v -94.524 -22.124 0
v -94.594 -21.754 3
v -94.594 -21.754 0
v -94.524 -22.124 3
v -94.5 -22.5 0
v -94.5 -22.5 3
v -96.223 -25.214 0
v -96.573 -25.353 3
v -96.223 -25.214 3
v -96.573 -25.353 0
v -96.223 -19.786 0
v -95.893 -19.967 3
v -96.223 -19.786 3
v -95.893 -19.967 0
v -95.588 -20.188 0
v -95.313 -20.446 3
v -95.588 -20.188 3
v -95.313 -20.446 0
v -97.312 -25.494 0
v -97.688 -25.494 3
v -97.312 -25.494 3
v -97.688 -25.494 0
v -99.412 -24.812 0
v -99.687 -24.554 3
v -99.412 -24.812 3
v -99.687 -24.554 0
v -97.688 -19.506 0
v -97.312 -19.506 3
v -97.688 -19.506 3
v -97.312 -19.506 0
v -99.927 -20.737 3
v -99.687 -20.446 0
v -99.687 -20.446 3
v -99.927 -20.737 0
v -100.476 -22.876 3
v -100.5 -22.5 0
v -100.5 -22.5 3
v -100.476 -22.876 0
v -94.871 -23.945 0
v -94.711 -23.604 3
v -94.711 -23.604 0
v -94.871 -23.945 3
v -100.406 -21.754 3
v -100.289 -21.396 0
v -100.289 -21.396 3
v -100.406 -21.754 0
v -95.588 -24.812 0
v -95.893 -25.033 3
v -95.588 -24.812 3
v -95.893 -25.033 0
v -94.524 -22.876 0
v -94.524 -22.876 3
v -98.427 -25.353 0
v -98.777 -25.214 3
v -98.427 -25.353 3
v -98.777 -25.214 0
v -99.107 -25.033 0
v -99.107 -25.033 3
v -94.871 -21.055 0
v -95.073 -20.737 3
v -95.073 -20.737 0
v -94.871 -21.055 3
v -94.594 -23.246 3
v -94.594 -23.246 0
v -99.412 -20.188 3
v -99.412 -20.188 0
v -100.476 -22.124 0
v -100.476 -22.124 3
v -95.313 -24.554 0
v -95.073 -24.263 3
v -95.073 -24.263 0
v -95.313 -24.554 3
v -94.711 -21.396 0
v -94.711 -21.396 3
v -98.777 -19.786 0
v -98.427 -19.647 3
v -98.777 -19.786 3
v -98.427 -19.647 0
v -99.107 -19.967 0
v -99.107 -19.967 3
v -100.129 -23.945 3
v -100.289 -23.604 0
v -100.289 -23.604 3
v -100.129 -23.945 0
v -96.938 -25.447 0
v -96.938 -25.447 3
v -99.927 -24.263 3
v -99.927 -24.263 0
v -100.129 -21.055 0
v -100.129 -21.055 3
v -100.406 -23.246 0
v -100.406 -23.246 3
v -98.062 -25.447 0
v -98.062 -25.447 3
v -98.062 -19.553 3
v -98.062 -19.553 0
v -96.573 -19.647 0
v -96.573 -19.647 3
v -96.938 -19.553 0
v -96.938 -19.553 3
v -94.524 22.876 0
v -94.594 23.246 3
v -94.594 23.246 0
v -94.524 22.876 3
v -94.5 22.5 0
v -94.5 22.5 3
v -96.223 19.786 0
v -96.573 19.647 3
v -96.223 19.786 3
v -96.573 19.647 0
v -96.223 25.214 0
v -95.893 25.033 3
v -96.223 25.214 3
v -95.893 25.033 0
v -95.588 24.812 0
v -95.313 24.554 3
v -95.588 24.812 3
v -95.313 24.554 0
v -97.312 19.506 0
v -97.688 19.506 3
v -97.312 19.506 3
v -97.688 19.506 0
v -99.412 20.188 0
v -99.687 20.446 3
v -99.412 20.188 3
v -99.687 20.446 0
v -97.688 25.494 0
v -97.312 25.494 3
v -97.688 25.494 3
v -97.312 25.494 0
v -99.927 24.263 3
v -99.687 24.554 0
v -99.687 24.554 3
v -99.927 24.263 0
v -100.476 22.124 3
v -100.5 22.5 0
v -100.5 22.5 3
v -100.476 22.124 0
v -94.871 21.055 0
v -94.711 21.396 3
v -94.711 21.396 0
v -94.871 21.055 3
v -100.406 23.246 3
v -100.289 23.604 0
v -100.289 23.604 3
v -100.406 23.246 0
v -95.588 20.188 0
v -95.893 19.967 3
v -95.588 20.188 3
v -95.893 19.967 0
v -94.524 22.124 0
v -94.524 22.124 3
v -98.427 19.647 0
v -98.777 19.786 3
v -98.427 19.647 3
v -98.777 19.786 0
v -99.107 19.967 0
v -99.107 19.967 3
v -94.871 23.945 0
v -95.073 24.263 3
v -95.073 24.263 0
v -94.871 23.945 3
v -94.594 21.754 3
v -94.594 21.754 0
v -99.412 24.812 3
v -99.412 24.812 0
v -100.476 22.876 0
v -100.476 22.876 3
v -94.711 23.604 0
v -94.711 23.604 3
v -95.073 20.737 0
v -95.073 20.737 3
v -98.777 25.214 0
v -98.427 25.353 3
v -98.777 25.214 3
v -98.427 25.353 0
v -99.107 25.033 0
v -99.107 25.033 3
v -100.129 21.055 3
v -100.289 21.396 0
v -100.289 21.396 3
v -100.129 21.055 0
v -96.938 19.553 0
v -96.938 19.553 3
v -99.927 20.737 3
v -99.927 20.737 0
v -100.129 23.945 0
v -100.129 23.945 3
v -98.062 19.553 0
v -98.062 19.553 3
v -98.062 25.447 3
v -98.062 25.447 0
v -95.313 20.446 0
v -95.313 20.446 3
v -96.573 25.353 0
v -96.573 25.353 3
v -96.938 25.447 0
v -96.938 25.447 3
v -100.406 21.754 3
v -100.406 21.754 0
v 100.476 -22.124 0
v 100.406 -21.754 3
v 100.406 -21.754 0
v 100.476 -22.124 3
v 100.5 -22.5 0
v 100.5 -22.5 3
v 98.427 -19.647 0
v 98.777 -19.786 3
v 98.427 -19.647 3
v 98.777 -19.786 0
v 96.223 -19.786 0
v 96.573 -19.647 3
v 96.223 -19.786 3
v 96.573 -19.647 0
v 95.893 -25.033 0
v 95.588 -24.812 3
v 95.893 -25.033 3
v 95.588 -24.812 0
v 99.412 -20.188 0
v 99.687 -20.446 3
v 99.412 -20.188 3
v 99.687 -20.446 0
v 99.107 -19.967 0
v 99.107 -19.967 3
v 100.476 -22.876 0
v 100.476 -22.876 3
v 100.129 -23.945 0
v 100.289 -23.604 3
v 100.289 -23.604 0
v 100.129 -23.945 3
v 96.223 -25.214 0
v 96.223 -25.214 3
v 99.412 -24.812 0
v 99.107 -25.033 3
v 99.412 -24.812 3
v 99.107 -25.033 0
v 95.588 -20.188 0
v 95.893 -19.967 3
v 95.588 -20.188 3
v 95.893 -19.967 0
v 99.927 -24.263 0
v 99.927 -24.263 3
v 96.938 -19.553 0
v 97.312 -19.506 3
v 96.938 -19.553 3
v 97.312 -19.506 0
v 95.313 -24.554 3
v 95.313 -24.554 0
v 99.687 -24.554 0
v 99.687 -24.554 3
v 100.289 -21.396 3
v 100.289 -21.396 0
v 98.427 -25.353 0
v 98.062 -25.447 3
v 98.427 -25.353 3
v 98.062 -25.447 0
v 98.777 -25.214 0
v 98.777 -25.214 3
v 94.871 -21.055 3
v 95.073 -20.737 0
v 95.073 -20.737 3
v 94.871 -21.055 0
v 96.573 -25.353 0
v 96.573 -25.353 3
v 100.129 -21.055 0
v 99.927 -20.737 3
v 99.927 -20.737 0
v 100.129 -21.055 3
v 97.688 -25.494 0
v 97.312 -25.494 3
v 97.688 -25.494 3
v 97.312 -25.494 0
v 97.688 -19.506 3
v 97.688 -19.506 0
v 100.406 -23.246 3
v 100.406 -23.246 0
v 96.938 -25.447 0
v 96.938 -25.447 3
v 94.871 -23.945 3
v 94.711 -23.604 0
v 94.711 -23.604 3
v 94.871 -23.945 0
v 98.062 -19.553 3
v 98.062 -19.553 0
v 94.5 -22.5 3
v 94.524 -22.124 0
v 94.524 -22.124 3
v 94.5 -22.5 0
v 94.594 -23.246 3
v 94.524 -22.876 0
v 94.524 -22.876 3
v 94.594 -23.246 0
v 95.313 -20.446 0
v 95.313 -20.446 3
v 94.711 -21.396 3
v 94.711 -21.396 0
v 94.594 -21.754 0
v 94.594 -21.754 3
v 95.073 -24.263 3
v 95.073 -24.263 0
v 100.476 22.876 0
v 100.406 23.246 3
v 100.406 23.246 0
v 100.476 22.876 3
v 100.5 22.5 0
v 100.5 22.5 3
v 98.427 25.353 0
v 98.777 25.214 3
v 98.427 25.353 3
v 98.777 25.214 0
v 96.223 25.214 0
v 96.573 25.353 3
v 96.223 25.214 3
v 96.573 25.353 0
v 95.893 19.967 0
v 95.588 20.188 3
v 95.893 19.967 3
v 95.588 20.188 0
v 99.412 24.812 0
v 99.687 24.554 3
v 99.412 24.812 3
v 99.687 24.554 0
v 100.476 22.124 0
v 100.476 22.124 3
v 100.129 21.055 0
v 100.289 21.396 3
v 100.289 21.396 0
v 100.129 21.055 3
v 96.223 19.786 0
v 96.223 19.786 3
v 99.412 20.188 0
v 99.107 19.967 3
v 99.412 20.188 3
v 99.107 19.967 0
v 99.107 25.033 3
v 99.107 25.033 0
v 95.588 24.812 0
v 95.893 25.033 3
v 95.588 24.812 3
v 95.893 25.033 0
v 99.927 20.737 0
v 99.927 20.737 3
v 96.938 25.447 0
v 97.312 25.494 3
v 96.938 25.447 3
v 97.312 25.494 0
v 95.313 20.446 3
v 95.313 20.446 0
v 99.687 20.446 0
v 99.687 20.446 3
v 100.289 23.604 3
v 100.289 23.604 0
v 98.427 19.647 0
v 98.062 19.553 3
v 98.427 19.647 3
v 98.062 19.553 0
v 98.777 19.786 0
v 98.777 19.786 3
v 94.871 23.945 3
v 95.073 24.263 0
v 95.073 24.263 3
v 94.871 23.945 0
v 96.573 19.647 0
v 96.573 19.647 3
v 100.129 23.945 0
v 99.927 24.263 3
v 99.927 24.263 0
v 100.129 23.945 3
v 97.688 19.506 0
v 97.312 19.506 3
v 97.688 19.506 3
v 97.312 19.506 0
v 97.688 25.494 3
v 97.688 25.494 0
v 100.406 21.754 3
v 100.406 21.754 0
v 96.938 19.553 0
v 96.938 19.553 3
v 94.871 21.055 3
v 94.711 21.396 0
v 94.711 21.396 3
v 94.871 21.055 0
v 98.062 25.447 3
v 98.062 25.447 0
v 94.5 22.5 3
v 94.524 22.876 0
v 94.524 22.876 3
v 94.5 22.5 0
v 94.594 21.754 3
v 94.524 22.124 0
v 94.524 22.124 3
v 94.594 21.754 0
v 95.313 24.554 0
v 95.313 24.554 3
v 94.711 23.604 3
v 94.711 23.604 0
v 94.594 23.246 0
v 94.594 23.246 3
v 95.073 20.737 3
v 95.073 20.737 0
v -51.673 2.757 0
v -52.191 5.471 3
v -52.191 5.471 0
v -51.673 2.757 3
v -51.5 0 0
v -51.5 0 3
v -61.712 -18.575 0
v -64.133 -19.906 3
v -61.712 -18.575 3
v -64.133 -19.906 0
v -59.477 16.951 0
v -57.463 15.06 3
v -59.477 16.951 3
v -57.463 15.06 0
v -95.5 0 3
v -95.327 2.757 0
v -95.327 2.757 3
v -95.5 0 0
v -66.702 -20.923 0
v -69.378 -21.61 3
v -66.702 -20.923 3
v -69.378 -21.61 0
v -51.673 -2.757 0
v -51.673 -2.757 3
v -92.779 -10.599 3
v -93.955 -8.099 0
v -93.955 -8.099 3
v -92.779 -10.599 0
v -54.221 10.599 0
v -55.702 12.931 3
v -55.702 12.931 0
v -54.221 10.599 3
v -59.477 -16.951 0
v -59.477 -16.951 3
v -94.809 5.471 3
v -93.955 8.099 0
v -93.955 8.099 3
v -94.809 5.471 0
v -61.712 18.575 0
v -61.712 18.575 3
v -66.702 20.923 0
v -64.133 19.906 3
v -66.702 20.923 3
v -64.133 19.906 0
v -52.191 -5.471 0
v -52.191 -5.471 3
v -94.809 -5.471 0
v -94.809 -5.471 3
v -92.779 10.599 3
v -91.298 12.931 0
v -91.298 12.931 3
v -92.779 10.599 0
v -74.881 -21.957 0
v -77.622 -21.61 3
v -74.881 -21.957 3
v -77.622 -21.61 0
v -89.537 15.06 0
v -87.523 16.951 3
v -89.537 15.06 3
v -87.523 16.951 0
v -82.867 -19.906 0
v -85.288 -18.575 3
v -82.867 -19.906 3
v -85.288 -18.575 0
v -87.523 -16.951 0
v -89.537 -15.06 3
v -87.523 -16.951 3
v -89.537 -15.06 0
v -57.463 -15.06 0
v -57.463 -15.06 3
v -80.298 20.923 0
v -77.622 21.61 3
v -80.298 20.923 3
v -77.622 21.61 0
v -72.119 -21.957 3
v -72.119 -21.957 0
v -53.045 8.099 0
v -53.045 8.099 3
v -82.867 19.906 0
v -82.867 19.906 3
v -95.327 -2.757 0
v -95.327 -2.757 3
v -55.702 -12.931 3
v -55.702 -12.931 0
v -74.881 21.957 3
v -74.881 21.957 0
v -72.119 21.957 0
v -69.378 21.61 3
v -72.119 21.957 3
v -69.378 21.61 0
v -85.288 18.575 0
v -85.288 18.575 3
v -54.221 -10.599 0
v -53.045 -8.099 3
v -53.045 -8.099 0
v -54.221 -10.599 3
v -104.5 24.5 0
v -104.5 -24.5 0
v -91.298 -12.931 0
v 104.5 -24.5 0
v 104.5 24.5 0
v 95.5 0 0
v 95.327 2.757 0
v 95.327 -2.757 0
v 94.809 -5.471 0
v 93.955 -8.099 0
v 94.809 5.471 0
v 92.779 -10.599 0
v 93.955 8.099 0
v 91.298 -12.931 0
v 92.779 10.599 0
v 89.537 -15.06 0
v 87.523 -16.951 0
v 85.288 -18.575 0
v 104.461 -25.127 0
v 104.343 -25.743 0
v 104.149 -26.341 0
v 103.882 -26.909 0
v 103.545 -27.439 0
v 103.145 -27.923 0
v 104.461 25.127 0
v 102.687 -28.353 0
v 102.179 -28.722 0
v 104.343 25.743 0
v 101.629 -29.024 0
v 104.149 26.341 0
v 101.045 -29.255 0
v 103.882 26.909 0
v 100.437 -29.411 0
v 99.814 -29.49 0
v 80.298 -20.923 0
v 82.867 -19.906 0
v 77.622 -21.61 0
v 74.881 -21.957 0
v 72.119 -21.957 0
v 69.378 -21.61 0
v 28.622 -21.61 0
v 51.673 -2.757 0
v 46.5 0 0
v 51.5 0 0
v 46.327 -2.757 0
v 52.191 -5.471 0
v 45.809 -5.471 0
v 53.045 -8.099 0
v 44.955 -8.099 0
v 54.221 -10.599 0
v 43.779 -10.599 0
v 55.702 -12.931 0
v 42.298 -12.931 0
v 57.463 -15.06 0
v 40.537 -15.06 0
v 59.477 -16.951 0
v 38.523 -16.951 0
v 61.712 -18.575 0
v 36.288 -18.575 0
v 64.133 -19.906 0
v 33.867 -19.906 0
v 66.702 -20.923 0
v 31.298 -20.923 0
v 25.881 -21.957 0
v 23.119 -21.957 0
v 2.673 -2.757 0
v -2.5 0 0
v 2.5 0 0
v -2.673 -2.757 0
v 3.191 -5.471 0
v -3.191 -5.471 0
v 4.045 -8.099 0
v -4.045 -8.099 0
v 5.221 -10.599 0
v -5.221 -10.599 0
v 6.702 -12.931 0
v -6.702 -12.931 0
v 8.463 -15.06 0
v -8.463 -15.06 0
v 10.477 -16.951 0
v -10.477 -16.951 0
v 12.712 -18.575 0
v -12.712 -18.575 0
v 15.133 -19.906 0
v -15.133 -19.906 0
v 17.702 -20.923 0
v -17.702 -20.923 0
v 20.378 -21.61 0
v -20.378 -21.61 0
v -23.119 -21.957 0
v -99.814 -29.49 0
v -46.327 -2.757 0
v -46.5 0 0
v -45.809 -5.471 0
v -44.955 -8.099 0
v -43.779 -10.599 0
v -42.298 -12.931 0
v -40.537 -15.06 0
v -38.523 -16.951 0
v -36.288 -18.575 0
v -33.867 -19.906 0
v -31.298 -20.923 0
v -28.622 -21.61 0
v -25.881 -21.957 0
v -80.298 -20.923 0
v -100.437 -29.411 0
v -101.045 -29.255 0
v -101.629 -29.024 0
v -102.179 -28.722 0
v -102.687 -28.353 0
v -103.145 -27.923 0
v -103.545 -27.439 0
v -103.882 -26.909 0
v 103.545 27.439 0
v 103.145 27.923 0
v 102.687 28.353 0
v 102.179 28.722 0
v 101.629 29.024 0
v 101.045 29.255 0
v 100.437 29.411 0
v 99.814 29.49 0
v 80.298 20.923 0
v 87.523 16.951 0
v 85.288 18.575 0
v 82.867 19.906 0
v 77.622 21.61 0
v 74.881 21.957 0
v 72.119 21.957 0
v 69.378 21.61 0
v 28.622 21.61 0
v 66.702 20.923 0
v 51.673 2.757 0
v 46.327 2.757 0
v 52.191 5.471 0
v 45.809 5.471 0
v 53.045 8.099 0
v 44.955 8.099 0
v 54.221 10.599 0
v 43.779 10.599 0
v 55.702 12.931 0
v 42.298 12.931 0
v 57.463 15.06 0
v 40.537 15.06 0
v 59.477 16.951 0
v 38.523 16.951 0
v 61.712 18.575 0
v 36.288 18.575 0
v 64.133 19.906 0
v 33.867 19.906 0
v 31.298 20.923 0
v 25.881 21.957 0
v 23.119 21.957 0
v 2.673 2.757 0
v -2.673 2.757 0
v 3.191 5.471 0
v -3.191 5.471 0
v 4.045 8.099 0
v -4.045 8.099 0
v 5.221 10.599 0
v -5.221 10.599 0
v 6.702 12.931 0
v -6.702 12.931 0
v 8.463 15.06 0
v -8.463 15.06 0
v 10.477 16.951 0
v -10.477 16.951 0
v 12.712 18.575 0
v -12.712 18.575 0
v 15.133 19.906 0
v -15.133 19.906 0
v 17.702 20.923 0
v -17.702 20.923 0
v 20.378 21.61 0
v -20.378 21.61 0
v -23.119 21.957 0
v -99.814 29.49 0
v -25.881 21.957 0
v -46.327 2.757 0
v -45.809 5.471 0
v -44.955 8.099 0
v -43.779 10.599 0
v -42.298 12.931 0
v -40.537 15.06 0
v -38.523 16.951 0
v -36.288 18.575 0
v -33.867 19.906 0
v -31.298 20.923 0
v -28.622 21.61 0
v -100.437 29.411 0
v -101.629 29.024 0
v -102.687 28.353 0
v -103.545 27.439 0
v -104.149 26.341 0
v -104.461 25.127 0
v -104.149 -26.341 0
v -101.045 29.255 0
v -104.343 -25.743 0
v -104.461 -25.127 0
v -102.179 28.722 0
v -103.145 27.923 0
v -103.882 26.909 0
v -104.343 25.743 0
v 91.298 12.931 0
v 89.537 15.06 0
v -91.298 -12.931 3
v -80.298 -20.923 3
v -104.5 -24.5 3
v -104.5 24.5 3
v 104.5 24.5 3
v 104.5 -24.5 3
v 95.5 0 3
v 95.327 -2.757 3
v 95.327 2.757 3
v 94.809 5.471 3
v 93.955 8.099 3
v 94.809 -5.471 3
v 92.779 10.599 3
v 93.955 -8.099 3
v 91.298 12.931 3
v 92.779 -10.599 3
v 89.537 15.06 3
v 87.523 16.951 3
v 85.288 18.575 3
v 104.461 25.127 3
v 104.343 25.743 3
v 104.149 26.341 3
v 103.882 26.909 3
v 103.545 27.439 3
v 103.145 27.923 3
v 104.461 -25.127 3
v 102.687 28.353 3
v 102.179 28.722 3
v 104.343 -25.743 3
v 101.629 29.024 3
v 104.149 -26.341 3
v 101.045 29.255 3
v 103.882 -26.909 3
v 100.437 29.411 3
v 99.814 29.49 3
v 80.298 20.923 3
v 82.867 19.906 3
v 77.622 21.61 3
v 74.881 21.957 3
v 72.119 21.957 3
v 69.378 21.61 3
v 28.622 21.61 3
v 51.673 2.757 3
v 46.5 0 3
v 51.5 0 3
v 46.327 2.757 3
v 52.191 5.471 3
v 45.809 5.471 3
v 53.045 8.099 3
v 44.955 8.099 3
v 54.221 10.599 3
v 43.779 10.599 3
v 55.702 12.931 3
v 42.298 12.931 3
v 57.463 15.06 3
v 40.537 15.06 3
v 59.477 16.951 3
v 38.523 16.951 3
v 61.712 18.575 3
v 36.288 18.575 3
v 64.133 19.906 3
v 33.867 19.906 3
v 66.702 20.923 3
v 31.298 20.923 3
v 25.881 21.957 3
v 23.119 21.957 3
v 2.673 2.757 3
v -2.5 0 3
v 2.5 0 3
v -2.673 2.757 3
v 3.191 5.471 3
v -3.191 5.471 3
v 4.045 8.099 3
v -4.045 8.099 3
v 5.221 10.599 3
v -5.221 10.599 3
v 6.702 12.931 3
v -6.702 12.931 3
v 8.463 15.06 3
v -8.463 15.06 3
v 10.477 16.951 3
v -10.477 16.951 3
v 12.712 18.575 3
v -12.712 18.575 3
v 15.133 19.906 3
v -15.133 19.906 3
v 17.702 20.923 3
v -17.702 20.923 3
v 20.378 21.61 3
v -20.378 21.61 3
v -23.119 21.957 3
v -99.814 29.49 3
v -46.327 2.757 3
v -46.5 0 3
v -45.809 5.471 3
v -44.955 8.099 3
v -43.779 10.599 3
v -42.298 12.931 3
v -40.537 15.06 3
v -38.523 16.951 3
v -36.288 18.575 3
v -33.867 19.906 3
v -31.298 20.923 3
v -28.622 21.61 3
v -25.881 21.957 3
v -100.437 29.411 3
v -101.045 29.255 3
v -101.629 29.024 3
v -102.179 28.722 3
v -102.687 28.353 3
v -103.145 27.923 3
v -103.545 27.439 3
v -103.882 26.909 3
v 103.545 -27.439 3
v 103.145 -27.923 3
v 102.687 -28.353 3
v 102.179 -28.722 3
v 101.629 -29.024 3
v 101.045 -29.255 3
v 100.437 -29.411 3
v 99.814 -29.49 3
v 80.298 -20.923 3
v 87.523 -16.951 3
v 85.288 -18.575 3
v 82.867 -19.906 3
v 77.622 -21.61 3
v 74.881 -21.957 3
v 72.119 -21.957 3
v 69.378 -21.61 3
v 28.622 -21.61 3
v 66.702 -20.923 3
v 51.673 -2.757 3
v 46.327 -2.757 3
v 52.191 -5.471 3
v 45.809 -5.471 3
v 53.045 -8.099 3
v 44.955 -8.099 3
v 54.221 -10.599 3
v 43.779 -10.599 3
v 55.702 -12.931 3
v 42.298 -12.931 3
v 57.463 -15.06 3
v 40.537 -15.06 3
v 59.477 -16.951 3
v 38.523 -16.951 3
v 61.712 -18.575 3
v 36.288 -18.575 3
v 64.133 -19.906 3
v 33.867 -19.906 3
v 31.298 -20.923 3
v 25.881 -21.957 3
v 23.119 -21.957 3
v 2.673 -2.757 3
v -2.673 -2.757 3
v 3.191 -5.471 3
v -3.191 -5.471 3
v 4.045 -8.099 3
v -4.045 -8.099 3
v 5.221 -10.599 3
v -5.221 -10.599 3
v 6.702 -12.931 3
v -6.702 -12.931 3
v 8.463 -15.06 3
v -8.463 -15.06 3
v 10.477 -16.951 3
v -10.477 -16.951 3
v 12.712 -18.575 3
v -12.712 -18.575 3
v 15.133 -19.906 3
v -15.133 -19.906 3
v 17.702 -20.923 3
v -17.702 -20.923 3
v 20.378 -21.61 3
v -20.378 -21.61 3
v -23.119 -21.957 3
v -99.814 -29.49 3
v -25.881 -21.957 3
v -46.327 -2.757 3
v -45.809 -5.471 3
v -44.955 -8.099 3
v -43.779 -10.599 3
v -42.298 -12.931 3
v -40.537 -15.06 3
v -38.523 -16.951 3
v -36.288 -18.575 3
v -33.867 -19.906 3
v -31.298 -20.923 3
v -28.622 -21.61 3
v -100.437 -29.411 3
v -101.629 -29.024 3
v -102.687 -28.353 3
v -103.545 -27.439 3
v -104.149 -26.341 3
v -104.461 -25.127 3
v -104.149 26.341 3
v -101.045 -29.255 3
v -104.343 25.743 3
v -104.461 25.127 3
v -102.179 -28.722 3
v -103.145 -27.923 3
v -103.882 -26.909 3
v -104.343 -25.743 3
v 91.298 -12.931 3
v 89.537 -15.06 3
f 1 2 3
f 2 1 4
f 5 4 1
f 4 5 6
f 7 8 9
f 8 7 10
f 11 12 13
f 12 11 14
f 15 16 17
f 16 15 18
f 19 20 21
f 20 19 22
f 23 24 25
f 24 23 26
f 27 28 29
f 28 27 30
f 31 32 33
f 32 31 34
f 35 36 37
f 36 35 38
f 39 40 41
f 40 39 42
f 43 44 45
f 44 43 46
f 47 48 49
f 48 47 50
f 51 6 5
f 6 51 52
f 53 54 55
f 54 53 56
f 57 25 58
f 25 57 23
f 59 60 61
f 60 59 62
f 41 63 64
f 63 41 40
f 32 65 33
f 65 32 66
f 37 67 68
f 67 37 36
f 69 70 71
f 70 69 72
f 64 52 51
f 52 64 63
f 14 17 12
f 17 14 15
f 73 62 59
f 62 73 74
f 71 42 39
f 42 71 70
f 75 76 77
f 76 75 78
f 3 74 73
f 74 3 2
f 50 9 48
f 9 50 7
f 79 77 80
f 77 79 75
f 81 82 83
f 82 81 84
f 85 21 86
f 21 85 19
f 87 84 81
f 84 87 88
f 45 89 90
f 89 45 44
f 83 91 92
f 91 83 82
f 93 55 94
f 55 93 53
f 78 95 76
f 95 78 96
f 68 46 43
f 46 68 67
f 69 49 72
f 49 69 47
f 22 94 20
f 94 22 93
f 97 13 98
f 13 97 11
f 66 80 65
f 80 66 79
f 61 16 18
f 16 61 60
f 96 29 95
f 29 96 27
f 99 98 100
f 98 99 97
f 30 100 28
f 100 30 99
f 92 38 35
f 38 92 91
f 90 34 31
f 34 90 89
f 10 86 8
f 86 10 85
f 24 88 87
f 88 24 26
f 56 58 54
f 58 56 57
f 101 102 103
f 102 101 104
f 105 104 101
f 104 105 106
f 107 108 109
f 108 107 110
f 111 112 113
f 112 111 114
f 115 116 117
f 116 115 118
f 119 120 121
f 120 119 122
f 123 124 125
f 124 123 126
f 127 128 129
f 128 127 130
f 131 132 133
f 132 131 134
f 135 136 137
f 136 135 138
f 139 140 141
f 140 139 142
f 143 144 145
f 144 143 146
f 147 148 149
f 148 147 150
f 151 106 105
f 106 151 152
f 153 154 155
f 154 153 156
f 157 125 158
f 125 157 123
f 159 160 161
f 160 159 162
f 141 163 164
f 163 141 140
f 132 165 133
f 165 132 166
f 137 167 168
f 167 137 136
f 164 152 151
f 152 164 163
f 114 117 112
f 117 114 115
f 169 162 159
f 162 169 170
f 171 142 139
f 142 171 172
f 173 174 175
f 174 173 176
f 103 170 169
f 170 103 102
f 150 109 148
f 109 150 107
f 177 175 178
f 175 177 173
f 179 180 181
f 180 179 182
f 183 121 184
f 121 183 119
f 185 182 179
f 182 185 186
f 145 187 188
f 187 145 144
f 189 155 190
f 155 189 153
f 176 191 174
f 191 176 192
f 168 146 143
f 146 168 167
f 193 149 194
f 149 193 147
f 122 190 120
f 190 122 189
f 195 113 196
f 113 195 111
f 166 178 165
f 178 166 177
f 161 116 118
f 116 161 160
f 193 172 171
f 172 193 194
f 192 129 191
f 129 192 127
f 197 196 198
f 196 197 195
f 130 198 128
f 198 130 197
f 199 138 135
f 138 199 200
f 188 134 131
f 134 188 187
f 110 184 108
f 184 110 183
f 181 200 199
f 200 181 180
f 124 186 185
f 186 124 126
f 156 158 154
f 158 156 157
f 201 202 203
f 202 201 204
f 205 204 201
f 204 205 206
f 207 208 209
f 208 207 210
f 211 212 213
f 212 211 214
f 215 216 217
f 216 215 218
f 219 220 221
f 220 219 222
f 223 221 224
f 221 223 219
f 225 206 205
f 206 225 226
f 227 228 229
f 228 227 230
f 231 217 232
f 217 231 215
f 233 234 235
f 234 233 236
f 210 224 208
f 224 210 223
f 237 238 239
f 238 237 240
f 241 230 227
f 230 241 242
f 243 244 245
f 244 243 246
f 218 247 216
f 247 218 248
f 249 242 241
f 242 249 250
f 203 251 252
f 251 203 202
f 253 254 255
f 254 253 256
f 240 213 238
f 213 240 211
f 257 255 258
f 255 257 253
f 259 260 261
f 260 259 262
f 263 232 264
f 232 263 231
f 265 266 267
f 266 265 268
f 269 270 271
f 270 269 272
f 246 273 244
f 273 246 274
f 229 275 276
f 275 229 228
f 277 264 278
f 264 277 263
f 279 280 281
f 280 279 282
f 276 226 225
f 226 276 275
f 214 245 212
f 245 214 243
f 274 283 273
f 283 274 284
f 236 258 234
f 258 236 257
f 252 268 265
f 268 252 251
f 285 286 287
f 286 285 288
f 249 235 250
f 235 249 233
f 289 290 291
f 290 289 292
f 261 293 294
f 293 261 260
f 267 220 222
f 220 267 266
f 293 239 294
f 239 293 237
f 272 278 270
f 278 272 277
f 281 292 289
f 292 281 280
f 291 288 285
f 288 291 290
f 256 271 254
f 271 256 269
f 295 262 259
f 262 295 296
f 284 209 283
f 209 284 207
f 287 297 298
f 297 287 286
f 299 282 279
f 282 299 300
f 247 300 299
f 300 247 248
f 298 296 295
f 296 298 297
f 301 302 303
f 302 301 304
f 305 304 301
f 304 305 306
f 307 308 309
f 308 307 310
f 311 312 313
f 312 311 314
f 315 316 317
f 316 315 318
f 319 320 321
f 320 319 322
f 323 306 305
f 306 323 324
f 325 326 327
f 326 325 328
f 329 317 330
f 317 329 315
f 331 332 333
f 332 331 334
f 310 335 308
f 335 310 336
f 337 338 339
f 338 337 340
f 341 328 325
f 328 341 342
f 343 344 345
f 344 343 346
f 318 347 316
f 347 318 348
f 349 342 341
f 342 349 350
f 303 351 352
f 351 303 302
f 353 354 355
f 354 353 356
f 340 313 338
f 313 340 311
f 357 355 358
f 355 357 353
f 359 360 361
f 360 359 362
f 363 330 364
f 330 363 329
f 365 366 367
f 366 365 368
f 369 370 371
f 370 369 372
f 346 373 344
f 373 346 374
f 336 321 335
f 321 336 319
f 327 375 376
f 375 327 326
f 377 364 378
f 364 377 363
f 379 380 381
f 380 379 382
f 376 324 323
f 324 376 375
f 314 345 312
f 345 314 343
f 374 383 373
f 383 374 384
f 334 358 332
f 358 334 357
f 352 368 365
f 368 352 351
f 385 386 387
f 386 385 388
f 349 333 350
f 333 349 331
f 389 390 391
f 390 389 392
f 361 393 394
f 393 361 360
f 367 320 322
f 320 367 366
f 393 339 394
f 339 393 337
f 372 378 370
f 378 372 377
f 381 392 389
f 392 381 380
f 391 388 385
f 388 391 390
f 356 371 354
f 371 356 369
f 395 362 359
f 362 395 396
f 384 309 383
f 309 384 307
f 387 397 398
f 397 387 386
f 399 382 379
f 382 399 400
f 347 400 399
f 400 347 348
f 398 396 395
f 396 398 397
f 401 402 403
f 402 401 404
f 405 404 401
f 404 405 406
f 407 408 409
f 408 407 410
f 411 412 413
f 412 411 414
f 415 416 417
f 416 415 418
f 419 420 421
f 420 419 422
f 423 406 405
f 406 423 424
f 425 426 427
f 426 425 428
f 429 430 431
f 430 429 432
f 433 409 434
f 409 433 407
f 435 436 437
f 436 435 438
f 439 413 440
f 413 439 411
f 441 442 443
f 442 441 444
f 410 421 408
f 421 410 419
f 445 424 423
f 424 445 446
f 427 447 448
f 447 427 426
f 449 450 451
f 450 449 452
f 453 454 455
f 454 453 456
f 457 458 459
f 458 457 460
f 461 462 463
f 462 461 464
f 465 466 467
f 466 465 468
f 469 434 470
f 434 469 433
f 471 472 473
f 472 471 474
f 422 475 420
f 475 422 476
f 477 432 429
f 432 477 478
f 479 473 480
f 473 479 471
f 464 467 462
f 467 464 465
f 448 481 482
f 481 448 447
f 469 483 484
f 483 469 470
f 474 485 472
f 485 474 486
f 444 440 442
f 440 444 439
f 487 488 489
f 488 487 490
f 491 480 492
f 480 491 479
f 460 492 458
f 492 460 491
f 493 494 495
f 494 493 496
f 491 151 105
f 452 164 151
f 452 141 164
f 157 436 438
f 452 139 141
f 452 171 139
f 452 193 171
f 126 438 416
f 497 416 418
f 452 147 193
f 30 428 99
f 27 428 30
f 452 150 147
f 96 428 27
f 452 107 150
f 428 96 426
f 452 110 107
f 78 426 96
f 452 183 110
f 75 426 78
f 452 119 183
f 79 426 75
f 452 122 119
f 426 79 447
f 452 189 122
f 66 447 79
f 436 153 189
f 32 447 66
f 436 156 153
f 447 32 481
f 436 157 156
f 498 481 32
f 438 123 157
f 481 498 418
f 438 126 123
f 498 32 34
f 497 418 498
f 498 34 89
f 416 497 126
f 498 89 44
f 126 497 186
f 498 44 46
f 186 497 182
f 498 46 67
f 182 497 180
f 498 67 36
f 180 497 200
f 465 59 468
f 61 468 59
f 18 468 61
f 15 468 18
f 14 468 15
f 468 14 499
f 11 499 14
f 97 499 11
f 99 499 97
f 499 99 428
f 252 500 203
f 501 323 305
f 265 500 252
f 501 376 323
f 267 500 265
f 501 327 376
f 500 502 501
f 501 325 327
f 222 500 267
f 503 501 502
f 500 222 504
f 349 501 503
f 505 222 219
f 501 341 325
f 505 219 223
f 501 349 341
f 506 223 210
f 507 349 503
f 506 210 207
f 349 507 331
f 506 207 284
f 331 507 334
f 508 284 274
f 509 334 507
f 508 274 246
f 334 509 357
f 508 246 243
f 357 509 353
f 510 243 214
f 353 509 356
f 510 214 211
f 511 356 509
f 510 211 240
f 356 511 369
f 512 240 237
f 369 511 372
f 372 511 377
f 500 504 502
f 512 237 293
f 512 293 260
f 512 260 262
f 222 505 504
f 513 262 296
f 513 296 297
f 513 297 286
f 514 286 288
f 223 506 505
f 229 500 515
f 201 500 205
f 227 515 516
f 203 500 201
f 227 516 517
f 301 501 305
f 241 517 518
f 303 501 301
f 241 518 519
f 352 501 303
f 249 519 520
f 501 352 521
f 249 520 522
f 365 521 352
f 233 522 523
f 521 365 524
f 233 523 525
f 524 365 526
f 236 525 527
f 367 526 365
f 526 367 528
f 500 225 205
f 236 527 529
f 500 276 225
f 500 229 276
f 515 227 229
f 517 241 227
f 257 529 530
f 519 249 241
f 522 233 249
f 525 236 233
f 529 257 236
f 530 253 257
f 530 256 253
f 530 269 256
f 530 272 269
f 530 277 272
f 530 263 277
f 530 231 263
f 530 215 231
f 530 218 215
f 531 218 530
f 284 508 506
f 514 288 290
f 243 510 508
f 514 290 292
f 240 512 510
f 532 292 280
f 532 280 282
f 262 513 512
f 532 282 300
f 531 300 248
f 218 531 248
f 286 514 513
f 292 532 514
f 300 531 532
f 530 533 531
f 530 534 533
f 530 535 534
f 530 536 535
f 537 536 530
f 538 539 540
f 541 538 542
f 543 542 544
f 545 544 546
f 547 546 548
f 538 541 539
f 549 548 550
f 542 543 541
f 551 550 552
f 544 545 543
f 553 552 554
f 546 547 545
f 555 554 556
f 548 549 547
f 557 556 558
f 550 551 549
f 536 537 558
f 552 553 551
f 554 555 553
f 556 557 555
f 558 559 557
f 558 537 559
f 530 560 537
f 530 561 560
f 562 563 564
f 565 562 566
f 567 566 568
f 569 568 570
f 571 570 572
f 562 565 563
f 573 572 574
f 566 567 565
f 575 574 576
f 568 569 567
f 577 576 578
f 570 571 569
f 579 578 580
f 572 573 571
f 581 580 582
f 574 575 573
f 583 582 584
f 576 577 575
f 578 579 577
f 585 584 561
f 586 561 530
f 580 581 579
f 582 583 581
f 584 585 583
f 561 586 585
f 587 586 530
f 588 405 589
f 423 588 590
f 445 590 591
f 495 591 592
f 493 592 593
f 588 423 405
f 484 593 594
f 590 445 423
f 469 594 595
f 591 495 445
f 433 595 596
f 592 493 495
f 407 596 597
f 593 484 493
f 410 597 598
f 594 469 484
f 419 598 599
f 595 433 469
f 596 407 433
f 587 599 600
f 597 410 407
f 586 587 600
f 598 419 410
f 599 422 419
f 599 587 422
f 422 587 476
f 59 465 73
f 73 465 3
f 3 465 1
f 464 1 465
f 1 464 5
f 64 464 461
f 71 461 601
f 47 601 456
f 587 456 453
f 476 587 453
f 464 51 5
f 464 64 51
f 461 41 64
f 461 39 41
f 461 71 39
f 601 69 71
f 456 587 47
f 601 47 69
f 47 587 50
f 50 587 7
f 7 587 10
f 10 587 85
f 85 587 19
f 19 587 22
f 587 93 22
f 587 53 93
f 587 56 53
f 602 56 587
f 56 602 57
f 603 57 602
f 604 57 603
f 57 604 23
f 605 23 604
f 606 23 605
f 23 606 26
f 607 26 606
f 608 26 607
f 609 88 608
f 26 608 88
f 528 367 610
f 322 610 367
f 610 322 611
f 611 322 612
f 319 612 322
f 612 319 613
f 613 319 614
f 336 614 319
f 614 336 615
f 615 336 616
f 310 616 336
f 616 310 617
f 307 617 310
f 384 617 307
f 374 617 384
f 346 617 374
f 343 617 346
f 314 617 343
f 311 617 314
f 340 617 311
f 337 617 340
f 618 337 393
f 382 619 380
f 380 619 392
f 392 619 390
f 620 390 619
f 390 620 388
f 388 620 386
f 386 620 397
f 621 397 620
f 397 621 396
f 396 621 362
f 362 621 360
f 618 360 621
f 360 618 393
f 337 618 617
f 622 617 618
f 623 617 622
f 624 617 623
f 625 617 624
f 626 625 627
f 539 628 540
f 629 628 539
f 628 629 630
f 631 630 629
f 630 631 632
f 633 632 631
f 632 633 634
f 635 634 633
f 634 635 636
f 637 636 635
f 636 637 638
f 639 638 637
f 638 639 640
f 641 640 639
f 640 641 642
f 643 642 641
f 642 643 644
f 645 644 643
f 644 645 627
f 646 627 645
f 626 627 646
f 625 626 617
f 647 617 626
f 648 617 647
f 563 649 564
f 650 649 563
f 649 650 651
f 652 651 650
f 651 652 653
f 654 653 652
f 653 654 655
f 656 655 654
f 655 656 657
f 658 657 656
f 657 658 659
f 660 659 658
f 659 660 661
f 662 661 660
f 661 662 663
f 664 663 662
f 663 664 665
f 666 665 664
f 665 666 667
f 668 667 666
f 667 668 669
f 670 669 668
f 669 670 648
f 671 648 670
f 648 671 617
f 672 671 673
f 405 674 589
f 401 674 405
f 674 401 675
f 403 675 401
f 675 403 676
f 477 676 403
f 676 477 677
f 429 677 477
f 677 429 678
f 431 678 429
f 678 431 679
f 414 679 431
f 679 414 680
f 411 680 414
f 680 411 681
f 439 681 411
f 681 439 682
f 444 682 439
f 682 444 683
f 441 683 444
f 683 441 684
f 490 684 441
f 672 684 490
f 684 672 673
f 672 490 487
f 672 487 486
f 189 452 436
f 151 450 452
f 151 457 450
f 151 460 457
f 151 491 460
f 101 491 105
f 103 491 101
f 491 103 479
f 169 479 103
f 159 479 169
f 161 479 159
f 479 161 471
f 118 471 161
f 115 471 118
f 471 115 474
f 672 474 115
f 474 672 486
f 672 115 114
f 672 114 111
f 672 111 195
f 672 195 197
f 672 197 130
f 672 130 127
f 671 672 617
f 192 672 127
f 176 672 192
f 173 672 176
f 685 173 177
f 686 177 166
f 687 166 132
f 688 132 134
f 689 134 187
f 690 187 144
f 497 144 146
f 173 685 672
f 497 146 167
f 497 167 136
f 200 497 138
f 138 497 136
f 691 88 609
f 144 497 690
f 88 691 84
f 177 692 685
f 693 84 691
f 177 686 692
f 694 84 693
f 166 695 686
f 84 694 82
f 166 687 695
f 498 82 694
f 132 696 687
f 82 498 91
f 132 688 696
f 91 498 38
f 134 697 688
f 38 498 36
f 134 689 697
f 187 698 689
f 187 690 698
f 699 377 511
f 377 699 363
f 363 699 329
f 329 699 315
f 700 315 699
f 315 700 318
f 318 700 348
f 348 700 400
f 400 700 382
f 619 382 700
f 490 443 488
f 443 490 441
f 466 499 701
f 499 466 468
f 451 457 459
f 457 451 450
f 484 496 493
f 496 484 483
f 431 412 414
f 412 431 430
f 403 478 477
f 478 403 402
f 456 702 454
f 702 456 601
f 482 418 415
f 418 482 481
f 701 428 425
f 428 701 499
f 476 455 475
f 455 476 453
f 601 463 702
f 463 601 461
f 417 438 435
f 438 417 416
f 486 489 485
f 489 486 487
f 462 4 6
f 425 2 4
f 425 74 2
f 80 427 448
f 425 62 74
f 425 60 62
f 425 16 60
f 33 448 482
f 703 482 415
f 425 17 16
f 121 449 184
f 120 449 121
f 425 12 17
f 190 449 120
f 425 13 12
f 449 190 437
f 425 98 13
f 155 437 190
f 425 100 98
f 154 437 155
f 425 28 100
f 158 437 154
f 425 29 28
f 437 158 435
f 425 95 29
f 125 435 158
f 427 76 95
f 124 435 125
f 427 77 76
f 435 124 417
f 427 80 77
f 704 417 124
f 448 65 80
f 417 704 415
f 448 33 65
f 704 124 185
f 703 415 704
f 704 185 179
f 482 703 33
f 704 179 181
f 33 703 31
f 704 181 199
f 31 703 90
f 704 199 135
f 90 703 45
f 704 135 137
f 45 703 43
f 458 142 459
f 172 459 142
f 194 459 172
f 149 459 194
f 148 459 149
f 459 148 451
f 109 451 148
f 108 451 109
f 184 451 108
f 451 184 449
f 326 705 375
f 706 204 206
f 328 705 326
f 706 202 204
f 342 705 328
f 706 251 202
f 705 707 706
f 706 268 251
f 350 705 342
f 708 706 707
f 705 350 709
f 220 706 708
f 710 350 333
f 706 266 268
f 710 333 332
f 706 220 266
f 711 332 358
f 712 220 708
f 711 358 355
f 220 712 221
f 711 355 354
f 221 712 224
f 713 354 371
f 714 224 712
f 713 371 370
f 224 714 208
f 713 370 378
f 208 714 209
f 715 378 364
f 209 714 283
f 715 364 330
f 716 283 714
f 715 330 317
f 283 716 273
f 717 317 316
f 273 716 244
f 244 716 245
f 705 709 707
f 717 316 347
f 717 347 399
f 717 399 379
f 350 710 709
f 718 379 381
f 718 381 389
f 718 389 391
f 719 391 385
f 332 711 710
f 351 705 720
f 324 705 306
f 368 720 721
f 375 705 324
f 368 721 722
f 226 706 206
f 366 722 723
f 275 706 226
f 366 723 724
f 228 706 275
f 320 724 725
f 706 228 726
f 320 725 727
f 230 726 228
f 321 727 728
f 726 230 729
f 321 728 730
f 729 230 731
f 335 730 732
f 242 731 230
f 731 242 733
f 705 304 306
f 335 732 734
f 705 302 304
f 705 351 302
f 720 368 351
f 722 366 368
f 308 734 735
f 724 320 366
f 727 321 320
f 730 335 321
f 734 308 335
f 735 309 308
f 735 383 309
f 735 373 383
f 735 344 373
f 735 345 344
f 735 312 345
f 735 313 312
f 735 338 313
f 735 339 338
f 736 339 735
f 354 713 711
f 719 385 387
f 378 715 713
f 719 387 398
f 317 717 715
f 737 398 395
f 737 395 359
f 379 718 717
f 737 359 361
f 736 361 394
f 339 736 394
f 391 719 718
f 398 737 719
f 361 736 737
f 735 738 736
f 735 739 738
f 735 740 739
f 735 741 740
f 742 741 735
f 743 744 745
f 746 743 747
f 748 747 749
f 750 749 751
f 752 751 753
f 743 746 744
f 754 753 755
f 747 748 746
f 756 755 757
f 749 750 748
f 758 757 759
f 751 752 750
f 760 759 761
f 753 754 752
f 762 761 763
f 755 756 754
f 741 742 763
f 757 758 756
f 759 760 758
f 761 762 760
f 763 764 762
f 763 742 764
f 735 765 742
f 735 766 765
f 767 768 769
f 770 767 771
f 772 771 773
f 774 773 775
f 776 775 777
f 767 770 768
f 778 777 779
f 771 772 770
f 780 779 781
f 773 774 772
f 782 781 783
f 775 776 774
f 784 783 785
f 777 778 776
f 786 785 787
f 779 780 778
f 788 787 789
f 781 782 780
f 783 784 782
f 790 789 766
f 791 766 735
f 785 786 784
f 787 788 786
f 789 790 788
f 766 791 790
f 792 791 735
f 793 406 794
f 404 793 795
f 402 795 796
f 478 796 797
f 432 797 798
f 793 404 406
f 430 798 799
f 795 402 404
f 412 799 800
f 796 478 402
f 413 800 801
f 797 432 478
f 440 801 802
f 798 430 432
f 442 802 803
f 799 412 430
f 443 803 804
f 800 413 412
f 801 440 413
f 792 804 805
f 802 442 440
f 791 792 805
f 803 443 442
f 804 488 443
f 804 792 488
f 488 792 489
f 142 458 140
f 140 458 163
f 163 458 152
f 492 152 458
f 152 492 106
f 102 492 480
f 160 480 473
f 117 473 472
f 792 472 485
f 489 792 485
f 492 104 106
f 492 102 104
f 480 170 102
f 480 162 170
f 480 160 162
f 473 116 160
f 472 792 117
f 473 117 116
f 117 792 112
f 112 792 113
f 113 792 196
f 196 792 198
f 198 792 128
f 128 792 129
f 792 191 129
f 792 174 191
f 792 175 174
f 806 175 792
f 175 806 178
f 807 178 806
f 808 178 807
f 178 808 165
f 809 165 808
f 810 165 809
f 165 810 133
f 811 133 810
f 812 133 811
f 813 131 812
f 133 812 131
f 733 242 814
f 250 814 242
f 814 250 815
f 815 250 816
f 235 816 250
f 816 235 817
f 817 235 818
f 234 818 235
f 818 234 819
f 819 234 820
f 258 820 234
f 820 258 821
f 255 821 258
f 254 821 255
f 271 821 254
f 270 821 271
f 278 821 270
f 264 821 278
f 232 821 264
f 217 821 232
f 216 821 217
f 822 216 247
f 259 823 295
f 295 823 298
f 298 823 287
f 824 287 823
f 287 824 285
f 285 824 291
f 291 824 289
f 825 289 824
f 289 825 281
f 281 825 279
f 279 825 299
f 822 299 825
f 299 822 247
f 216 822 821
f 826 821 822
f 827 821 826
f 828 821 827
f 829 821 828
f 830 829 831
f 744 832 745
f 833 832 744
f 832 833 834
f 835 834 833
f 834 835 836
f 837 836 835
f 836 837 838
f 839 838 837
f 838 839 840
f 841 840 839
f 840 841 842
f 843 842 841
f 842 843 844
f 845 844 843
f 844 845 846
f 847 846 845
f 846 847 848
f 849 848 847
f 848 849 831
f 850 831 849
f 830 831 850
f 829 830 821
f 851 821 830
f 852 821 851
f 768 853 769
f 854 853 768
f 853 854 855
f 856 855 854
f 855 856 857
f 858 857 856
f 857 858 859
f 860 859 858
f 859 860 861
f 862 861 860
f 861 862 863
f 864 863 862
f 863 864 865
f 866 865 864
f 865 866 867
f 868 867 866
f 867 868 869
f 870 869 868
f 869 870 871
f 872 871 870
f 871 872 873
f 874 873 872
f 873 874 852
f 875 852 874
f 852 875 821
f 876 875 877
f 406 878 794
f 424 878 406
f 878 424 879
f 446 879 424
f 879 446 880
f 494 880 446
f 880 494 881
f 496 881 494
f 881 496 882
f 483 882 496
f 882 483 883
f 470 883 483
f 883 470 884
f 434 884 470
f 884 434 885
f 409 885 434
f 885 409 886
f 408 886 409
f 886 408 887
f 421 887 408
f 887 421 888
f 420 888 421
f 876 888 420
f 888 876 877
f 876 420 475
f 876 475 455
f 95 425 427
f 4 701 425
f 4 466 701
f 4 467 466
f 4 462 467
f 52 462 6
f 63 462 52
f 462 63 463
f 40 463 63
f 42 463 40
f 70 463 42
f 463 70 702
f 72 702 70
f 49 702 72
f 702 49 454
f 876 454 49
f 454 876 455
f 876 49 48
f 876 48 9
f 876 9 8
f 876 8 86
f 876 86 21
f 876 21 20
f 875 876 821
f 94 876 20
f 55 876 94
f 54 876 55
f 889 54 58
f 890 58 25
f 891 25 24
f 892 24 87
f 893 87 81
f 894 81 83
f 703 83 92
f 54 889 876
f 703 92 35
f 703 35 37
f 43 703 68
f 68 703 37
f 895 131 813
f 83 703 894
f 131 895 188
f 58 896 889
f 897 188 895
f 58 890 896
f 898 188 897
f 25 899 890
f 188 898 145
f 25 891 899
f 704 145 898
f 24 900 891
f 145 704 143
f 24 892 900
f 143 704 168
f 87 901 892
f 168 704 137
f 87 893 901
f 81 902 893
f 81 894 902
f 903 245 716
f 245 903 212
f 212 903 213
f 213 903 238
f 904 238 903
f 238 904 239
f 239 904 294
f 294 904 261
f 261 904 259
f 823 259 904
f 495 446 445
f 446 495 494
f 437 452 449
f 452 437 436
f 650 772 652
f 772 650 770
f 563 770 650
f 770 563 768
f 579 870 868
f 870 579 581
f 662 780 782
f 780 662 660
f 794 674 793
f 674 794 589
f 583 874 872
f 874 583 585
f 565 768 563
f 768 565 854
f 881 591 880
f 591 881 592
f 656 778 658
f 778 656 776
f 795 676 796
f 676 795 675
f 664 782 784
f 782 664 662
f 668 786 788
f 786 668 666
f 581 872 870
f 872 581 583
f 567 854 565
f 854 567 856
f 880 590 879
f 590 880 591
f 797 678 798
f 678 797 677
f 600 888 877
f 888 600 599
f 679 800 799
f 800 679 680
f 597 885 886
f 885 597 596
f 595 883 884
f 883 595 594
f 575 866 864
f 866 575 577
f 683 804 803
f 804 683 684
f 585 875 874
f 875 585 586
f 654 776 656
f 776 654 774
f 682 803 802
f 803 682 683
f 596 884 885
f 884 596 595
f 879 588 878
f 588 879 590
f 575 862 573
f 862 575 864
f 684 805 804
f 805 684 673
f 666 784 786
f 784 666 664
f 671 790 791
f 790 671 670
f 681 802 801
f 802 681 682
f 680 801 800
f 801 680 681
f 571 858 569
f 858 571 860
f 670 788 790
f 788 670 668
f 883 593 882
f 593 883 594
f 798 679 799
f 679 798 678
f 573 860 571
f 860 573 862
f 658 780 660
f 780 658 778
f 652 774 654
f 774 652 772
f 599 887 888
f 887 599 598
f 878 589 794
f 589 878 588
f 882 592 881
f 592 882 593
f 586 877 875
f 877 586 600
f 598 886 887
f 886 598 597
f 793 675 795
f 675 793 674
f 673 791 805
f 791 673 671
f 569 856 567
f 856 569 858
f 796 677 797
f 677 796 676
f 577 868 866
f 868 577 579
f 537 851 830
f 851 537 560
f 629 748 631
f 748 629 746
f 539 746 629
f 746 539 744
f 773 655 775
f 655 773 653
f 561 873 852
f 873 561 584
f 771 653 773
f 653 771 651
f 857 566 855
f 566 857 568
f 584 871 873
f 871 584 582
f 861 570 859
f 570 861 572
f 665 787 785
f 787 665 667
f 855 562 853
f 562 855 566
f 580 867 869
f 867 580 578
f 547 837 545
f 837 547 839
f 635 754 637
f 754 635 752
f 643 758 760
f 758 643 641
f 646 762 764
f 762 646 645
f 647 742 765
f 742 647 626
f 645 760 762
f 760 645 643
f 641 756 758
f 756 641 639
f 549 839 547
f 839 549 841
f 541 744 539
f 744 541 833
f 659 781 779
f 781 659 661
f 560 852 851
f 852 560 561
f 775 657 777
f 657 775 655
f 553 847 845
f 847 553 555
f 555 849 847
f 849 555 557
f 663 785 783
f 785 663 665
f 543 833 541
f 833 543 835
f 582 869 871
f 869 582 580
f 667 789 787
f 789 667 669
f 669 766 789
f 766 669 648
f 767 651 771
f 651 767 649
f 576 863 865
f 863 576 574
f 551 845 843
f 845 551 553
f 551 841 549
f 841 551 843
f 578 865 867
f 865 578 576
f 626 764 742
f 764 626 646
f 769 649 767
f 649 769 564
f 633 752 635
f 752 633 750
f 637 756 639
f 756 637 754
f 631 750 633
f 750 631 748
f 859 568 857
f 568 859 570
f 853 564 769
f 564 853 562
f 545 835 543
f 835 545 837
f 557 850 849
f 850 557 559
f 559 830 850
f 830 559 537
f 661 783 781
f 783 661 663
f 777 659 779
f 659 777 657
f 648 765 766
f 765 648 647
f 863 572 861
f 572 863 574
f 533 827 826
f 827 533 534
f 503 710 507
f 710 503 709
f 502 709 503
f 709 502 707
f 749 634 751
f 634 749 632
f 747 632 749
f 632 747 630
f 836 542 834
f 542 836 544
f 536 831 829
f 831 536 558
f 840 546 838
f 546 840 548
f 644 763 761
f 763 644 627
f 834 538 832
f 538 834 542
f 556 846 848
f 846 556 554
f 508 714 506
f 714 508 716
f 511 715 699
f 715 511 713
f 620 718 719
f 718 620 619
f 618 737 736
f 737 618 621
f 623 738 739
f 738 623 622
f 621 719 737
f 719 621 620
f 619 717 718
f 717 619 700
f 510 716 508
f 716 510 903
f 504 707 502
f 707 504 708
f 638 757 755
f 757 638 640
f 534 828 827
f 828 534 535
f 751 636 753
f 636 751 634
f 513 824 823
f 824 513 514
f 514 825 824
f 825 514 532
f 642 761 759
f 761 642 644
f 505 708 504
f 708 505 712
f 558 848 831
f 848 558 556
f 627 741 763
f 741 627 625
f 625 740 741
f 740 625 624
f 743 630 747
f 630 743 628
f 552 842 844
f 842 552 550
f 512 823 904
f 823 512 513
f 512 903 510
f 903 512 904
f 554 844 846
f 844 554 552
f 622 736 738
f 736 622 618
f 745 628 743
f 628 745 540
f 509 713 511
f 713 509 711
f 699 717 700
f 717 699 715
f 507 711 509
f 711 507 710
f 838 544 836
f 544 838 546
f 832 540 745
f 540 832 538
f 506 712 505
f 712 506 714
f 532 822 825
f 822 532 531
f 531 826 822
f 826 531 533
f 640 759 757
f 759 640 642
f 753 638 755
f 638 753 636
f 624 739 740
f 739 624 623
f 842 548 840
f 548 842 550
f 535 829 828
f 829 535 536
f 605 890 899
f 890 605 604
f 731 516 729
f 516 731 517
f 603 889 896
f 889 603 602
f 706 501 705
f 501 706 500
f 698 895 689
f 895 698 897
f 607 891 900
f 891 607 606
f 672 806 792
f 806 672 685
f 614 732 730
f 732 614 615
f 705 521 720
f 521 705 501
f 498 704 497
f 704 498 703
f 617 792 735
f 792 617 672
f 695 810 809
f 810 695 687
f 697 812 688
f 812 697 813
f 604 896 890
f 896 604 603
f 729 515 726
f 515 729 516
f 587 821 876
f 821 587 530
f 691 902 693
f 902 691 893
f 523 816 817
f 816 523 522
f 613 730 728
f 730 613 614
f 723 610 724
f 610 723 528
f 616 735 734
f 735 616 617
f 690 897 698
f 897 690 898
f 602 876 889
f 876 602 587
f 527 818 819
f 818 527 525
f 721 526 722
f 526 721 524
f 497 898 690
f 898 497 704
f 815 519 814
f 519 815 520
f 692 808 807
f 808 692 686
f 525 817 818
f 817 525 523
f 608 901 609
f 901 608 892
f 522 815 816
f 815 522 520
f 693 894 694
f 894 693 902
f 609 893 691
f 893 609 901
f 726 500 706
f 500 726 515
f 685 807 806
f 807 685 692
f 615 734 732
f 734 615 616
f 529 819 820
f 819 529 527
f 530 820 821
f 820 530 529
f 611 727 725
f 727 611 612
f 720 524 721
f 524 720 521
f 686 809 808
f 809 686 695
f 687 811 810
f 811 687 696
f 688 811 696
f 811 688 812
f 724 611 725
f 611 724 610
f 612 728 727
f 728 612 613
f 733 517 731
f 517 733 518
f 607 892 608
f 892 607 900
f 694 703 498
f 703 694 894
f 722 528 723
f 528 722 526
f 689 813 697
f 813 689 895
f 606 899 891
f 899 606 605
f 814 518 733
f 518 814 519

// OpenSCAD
$fn = 50;


difference() {
	union() {
		hull() {
			translate(v = [-99.5000000000, 24.5000000000, 0]) {
				cylinder(h = 3, r = 5);
			}
			translate(v = [99.5000000000, 24.5000000000, 0]) {
				cylinder(h = 3, r = 5);
			}
			translate(v = [-99.5000000000, -24.5000000000, 0]) {
				cylinder(h = 3, r = 5);
			}
			translate(v = [99.5000000000, -24.5000000000, 0]) {
				cylinder(h = 3, r = 5);
			}
		}
	}
	union() {
		#translate(v = [-97.5000000000, -22.5000000000, -100.0000000000]) {
			cylinder(h = 200, r = 3.0000000000);
		}
		#translate(v = [-97.5000000000, 22.5000000000, -100.0000000000]) {
			cylinder(h = 200, r = 3.0000000000);
		}
		#translate(v = [97.5000000000, -22.5000000000, -100.0000000000]) {
			cylinder(h = 200, r = 3.0000000000);
		}
		#translate(v = [97.5000000000, 22.5000000000, -100.0000000000]) {
			cylinder(h = 200, r = 3.0000000000);
		}
		#translate(v = [-73.5000000000, 0, 0]) {
			cylinder(h = 3, r = 22.0000000000);
		}
		#translate(v = [-24.5000000000, 0, 0]) {
			cylinder(h = 3, r = 22.0000000000);
		}
		#translate(v = [24.5000000000, 0, 0]) {
			cylinder(h = 3, r = 22.0000000000);
		}
		#translate(v = [73.5000000000, 0, 0]) {
			cylinder(h = 3, r = 22.0000000000);
		}
	}
}
